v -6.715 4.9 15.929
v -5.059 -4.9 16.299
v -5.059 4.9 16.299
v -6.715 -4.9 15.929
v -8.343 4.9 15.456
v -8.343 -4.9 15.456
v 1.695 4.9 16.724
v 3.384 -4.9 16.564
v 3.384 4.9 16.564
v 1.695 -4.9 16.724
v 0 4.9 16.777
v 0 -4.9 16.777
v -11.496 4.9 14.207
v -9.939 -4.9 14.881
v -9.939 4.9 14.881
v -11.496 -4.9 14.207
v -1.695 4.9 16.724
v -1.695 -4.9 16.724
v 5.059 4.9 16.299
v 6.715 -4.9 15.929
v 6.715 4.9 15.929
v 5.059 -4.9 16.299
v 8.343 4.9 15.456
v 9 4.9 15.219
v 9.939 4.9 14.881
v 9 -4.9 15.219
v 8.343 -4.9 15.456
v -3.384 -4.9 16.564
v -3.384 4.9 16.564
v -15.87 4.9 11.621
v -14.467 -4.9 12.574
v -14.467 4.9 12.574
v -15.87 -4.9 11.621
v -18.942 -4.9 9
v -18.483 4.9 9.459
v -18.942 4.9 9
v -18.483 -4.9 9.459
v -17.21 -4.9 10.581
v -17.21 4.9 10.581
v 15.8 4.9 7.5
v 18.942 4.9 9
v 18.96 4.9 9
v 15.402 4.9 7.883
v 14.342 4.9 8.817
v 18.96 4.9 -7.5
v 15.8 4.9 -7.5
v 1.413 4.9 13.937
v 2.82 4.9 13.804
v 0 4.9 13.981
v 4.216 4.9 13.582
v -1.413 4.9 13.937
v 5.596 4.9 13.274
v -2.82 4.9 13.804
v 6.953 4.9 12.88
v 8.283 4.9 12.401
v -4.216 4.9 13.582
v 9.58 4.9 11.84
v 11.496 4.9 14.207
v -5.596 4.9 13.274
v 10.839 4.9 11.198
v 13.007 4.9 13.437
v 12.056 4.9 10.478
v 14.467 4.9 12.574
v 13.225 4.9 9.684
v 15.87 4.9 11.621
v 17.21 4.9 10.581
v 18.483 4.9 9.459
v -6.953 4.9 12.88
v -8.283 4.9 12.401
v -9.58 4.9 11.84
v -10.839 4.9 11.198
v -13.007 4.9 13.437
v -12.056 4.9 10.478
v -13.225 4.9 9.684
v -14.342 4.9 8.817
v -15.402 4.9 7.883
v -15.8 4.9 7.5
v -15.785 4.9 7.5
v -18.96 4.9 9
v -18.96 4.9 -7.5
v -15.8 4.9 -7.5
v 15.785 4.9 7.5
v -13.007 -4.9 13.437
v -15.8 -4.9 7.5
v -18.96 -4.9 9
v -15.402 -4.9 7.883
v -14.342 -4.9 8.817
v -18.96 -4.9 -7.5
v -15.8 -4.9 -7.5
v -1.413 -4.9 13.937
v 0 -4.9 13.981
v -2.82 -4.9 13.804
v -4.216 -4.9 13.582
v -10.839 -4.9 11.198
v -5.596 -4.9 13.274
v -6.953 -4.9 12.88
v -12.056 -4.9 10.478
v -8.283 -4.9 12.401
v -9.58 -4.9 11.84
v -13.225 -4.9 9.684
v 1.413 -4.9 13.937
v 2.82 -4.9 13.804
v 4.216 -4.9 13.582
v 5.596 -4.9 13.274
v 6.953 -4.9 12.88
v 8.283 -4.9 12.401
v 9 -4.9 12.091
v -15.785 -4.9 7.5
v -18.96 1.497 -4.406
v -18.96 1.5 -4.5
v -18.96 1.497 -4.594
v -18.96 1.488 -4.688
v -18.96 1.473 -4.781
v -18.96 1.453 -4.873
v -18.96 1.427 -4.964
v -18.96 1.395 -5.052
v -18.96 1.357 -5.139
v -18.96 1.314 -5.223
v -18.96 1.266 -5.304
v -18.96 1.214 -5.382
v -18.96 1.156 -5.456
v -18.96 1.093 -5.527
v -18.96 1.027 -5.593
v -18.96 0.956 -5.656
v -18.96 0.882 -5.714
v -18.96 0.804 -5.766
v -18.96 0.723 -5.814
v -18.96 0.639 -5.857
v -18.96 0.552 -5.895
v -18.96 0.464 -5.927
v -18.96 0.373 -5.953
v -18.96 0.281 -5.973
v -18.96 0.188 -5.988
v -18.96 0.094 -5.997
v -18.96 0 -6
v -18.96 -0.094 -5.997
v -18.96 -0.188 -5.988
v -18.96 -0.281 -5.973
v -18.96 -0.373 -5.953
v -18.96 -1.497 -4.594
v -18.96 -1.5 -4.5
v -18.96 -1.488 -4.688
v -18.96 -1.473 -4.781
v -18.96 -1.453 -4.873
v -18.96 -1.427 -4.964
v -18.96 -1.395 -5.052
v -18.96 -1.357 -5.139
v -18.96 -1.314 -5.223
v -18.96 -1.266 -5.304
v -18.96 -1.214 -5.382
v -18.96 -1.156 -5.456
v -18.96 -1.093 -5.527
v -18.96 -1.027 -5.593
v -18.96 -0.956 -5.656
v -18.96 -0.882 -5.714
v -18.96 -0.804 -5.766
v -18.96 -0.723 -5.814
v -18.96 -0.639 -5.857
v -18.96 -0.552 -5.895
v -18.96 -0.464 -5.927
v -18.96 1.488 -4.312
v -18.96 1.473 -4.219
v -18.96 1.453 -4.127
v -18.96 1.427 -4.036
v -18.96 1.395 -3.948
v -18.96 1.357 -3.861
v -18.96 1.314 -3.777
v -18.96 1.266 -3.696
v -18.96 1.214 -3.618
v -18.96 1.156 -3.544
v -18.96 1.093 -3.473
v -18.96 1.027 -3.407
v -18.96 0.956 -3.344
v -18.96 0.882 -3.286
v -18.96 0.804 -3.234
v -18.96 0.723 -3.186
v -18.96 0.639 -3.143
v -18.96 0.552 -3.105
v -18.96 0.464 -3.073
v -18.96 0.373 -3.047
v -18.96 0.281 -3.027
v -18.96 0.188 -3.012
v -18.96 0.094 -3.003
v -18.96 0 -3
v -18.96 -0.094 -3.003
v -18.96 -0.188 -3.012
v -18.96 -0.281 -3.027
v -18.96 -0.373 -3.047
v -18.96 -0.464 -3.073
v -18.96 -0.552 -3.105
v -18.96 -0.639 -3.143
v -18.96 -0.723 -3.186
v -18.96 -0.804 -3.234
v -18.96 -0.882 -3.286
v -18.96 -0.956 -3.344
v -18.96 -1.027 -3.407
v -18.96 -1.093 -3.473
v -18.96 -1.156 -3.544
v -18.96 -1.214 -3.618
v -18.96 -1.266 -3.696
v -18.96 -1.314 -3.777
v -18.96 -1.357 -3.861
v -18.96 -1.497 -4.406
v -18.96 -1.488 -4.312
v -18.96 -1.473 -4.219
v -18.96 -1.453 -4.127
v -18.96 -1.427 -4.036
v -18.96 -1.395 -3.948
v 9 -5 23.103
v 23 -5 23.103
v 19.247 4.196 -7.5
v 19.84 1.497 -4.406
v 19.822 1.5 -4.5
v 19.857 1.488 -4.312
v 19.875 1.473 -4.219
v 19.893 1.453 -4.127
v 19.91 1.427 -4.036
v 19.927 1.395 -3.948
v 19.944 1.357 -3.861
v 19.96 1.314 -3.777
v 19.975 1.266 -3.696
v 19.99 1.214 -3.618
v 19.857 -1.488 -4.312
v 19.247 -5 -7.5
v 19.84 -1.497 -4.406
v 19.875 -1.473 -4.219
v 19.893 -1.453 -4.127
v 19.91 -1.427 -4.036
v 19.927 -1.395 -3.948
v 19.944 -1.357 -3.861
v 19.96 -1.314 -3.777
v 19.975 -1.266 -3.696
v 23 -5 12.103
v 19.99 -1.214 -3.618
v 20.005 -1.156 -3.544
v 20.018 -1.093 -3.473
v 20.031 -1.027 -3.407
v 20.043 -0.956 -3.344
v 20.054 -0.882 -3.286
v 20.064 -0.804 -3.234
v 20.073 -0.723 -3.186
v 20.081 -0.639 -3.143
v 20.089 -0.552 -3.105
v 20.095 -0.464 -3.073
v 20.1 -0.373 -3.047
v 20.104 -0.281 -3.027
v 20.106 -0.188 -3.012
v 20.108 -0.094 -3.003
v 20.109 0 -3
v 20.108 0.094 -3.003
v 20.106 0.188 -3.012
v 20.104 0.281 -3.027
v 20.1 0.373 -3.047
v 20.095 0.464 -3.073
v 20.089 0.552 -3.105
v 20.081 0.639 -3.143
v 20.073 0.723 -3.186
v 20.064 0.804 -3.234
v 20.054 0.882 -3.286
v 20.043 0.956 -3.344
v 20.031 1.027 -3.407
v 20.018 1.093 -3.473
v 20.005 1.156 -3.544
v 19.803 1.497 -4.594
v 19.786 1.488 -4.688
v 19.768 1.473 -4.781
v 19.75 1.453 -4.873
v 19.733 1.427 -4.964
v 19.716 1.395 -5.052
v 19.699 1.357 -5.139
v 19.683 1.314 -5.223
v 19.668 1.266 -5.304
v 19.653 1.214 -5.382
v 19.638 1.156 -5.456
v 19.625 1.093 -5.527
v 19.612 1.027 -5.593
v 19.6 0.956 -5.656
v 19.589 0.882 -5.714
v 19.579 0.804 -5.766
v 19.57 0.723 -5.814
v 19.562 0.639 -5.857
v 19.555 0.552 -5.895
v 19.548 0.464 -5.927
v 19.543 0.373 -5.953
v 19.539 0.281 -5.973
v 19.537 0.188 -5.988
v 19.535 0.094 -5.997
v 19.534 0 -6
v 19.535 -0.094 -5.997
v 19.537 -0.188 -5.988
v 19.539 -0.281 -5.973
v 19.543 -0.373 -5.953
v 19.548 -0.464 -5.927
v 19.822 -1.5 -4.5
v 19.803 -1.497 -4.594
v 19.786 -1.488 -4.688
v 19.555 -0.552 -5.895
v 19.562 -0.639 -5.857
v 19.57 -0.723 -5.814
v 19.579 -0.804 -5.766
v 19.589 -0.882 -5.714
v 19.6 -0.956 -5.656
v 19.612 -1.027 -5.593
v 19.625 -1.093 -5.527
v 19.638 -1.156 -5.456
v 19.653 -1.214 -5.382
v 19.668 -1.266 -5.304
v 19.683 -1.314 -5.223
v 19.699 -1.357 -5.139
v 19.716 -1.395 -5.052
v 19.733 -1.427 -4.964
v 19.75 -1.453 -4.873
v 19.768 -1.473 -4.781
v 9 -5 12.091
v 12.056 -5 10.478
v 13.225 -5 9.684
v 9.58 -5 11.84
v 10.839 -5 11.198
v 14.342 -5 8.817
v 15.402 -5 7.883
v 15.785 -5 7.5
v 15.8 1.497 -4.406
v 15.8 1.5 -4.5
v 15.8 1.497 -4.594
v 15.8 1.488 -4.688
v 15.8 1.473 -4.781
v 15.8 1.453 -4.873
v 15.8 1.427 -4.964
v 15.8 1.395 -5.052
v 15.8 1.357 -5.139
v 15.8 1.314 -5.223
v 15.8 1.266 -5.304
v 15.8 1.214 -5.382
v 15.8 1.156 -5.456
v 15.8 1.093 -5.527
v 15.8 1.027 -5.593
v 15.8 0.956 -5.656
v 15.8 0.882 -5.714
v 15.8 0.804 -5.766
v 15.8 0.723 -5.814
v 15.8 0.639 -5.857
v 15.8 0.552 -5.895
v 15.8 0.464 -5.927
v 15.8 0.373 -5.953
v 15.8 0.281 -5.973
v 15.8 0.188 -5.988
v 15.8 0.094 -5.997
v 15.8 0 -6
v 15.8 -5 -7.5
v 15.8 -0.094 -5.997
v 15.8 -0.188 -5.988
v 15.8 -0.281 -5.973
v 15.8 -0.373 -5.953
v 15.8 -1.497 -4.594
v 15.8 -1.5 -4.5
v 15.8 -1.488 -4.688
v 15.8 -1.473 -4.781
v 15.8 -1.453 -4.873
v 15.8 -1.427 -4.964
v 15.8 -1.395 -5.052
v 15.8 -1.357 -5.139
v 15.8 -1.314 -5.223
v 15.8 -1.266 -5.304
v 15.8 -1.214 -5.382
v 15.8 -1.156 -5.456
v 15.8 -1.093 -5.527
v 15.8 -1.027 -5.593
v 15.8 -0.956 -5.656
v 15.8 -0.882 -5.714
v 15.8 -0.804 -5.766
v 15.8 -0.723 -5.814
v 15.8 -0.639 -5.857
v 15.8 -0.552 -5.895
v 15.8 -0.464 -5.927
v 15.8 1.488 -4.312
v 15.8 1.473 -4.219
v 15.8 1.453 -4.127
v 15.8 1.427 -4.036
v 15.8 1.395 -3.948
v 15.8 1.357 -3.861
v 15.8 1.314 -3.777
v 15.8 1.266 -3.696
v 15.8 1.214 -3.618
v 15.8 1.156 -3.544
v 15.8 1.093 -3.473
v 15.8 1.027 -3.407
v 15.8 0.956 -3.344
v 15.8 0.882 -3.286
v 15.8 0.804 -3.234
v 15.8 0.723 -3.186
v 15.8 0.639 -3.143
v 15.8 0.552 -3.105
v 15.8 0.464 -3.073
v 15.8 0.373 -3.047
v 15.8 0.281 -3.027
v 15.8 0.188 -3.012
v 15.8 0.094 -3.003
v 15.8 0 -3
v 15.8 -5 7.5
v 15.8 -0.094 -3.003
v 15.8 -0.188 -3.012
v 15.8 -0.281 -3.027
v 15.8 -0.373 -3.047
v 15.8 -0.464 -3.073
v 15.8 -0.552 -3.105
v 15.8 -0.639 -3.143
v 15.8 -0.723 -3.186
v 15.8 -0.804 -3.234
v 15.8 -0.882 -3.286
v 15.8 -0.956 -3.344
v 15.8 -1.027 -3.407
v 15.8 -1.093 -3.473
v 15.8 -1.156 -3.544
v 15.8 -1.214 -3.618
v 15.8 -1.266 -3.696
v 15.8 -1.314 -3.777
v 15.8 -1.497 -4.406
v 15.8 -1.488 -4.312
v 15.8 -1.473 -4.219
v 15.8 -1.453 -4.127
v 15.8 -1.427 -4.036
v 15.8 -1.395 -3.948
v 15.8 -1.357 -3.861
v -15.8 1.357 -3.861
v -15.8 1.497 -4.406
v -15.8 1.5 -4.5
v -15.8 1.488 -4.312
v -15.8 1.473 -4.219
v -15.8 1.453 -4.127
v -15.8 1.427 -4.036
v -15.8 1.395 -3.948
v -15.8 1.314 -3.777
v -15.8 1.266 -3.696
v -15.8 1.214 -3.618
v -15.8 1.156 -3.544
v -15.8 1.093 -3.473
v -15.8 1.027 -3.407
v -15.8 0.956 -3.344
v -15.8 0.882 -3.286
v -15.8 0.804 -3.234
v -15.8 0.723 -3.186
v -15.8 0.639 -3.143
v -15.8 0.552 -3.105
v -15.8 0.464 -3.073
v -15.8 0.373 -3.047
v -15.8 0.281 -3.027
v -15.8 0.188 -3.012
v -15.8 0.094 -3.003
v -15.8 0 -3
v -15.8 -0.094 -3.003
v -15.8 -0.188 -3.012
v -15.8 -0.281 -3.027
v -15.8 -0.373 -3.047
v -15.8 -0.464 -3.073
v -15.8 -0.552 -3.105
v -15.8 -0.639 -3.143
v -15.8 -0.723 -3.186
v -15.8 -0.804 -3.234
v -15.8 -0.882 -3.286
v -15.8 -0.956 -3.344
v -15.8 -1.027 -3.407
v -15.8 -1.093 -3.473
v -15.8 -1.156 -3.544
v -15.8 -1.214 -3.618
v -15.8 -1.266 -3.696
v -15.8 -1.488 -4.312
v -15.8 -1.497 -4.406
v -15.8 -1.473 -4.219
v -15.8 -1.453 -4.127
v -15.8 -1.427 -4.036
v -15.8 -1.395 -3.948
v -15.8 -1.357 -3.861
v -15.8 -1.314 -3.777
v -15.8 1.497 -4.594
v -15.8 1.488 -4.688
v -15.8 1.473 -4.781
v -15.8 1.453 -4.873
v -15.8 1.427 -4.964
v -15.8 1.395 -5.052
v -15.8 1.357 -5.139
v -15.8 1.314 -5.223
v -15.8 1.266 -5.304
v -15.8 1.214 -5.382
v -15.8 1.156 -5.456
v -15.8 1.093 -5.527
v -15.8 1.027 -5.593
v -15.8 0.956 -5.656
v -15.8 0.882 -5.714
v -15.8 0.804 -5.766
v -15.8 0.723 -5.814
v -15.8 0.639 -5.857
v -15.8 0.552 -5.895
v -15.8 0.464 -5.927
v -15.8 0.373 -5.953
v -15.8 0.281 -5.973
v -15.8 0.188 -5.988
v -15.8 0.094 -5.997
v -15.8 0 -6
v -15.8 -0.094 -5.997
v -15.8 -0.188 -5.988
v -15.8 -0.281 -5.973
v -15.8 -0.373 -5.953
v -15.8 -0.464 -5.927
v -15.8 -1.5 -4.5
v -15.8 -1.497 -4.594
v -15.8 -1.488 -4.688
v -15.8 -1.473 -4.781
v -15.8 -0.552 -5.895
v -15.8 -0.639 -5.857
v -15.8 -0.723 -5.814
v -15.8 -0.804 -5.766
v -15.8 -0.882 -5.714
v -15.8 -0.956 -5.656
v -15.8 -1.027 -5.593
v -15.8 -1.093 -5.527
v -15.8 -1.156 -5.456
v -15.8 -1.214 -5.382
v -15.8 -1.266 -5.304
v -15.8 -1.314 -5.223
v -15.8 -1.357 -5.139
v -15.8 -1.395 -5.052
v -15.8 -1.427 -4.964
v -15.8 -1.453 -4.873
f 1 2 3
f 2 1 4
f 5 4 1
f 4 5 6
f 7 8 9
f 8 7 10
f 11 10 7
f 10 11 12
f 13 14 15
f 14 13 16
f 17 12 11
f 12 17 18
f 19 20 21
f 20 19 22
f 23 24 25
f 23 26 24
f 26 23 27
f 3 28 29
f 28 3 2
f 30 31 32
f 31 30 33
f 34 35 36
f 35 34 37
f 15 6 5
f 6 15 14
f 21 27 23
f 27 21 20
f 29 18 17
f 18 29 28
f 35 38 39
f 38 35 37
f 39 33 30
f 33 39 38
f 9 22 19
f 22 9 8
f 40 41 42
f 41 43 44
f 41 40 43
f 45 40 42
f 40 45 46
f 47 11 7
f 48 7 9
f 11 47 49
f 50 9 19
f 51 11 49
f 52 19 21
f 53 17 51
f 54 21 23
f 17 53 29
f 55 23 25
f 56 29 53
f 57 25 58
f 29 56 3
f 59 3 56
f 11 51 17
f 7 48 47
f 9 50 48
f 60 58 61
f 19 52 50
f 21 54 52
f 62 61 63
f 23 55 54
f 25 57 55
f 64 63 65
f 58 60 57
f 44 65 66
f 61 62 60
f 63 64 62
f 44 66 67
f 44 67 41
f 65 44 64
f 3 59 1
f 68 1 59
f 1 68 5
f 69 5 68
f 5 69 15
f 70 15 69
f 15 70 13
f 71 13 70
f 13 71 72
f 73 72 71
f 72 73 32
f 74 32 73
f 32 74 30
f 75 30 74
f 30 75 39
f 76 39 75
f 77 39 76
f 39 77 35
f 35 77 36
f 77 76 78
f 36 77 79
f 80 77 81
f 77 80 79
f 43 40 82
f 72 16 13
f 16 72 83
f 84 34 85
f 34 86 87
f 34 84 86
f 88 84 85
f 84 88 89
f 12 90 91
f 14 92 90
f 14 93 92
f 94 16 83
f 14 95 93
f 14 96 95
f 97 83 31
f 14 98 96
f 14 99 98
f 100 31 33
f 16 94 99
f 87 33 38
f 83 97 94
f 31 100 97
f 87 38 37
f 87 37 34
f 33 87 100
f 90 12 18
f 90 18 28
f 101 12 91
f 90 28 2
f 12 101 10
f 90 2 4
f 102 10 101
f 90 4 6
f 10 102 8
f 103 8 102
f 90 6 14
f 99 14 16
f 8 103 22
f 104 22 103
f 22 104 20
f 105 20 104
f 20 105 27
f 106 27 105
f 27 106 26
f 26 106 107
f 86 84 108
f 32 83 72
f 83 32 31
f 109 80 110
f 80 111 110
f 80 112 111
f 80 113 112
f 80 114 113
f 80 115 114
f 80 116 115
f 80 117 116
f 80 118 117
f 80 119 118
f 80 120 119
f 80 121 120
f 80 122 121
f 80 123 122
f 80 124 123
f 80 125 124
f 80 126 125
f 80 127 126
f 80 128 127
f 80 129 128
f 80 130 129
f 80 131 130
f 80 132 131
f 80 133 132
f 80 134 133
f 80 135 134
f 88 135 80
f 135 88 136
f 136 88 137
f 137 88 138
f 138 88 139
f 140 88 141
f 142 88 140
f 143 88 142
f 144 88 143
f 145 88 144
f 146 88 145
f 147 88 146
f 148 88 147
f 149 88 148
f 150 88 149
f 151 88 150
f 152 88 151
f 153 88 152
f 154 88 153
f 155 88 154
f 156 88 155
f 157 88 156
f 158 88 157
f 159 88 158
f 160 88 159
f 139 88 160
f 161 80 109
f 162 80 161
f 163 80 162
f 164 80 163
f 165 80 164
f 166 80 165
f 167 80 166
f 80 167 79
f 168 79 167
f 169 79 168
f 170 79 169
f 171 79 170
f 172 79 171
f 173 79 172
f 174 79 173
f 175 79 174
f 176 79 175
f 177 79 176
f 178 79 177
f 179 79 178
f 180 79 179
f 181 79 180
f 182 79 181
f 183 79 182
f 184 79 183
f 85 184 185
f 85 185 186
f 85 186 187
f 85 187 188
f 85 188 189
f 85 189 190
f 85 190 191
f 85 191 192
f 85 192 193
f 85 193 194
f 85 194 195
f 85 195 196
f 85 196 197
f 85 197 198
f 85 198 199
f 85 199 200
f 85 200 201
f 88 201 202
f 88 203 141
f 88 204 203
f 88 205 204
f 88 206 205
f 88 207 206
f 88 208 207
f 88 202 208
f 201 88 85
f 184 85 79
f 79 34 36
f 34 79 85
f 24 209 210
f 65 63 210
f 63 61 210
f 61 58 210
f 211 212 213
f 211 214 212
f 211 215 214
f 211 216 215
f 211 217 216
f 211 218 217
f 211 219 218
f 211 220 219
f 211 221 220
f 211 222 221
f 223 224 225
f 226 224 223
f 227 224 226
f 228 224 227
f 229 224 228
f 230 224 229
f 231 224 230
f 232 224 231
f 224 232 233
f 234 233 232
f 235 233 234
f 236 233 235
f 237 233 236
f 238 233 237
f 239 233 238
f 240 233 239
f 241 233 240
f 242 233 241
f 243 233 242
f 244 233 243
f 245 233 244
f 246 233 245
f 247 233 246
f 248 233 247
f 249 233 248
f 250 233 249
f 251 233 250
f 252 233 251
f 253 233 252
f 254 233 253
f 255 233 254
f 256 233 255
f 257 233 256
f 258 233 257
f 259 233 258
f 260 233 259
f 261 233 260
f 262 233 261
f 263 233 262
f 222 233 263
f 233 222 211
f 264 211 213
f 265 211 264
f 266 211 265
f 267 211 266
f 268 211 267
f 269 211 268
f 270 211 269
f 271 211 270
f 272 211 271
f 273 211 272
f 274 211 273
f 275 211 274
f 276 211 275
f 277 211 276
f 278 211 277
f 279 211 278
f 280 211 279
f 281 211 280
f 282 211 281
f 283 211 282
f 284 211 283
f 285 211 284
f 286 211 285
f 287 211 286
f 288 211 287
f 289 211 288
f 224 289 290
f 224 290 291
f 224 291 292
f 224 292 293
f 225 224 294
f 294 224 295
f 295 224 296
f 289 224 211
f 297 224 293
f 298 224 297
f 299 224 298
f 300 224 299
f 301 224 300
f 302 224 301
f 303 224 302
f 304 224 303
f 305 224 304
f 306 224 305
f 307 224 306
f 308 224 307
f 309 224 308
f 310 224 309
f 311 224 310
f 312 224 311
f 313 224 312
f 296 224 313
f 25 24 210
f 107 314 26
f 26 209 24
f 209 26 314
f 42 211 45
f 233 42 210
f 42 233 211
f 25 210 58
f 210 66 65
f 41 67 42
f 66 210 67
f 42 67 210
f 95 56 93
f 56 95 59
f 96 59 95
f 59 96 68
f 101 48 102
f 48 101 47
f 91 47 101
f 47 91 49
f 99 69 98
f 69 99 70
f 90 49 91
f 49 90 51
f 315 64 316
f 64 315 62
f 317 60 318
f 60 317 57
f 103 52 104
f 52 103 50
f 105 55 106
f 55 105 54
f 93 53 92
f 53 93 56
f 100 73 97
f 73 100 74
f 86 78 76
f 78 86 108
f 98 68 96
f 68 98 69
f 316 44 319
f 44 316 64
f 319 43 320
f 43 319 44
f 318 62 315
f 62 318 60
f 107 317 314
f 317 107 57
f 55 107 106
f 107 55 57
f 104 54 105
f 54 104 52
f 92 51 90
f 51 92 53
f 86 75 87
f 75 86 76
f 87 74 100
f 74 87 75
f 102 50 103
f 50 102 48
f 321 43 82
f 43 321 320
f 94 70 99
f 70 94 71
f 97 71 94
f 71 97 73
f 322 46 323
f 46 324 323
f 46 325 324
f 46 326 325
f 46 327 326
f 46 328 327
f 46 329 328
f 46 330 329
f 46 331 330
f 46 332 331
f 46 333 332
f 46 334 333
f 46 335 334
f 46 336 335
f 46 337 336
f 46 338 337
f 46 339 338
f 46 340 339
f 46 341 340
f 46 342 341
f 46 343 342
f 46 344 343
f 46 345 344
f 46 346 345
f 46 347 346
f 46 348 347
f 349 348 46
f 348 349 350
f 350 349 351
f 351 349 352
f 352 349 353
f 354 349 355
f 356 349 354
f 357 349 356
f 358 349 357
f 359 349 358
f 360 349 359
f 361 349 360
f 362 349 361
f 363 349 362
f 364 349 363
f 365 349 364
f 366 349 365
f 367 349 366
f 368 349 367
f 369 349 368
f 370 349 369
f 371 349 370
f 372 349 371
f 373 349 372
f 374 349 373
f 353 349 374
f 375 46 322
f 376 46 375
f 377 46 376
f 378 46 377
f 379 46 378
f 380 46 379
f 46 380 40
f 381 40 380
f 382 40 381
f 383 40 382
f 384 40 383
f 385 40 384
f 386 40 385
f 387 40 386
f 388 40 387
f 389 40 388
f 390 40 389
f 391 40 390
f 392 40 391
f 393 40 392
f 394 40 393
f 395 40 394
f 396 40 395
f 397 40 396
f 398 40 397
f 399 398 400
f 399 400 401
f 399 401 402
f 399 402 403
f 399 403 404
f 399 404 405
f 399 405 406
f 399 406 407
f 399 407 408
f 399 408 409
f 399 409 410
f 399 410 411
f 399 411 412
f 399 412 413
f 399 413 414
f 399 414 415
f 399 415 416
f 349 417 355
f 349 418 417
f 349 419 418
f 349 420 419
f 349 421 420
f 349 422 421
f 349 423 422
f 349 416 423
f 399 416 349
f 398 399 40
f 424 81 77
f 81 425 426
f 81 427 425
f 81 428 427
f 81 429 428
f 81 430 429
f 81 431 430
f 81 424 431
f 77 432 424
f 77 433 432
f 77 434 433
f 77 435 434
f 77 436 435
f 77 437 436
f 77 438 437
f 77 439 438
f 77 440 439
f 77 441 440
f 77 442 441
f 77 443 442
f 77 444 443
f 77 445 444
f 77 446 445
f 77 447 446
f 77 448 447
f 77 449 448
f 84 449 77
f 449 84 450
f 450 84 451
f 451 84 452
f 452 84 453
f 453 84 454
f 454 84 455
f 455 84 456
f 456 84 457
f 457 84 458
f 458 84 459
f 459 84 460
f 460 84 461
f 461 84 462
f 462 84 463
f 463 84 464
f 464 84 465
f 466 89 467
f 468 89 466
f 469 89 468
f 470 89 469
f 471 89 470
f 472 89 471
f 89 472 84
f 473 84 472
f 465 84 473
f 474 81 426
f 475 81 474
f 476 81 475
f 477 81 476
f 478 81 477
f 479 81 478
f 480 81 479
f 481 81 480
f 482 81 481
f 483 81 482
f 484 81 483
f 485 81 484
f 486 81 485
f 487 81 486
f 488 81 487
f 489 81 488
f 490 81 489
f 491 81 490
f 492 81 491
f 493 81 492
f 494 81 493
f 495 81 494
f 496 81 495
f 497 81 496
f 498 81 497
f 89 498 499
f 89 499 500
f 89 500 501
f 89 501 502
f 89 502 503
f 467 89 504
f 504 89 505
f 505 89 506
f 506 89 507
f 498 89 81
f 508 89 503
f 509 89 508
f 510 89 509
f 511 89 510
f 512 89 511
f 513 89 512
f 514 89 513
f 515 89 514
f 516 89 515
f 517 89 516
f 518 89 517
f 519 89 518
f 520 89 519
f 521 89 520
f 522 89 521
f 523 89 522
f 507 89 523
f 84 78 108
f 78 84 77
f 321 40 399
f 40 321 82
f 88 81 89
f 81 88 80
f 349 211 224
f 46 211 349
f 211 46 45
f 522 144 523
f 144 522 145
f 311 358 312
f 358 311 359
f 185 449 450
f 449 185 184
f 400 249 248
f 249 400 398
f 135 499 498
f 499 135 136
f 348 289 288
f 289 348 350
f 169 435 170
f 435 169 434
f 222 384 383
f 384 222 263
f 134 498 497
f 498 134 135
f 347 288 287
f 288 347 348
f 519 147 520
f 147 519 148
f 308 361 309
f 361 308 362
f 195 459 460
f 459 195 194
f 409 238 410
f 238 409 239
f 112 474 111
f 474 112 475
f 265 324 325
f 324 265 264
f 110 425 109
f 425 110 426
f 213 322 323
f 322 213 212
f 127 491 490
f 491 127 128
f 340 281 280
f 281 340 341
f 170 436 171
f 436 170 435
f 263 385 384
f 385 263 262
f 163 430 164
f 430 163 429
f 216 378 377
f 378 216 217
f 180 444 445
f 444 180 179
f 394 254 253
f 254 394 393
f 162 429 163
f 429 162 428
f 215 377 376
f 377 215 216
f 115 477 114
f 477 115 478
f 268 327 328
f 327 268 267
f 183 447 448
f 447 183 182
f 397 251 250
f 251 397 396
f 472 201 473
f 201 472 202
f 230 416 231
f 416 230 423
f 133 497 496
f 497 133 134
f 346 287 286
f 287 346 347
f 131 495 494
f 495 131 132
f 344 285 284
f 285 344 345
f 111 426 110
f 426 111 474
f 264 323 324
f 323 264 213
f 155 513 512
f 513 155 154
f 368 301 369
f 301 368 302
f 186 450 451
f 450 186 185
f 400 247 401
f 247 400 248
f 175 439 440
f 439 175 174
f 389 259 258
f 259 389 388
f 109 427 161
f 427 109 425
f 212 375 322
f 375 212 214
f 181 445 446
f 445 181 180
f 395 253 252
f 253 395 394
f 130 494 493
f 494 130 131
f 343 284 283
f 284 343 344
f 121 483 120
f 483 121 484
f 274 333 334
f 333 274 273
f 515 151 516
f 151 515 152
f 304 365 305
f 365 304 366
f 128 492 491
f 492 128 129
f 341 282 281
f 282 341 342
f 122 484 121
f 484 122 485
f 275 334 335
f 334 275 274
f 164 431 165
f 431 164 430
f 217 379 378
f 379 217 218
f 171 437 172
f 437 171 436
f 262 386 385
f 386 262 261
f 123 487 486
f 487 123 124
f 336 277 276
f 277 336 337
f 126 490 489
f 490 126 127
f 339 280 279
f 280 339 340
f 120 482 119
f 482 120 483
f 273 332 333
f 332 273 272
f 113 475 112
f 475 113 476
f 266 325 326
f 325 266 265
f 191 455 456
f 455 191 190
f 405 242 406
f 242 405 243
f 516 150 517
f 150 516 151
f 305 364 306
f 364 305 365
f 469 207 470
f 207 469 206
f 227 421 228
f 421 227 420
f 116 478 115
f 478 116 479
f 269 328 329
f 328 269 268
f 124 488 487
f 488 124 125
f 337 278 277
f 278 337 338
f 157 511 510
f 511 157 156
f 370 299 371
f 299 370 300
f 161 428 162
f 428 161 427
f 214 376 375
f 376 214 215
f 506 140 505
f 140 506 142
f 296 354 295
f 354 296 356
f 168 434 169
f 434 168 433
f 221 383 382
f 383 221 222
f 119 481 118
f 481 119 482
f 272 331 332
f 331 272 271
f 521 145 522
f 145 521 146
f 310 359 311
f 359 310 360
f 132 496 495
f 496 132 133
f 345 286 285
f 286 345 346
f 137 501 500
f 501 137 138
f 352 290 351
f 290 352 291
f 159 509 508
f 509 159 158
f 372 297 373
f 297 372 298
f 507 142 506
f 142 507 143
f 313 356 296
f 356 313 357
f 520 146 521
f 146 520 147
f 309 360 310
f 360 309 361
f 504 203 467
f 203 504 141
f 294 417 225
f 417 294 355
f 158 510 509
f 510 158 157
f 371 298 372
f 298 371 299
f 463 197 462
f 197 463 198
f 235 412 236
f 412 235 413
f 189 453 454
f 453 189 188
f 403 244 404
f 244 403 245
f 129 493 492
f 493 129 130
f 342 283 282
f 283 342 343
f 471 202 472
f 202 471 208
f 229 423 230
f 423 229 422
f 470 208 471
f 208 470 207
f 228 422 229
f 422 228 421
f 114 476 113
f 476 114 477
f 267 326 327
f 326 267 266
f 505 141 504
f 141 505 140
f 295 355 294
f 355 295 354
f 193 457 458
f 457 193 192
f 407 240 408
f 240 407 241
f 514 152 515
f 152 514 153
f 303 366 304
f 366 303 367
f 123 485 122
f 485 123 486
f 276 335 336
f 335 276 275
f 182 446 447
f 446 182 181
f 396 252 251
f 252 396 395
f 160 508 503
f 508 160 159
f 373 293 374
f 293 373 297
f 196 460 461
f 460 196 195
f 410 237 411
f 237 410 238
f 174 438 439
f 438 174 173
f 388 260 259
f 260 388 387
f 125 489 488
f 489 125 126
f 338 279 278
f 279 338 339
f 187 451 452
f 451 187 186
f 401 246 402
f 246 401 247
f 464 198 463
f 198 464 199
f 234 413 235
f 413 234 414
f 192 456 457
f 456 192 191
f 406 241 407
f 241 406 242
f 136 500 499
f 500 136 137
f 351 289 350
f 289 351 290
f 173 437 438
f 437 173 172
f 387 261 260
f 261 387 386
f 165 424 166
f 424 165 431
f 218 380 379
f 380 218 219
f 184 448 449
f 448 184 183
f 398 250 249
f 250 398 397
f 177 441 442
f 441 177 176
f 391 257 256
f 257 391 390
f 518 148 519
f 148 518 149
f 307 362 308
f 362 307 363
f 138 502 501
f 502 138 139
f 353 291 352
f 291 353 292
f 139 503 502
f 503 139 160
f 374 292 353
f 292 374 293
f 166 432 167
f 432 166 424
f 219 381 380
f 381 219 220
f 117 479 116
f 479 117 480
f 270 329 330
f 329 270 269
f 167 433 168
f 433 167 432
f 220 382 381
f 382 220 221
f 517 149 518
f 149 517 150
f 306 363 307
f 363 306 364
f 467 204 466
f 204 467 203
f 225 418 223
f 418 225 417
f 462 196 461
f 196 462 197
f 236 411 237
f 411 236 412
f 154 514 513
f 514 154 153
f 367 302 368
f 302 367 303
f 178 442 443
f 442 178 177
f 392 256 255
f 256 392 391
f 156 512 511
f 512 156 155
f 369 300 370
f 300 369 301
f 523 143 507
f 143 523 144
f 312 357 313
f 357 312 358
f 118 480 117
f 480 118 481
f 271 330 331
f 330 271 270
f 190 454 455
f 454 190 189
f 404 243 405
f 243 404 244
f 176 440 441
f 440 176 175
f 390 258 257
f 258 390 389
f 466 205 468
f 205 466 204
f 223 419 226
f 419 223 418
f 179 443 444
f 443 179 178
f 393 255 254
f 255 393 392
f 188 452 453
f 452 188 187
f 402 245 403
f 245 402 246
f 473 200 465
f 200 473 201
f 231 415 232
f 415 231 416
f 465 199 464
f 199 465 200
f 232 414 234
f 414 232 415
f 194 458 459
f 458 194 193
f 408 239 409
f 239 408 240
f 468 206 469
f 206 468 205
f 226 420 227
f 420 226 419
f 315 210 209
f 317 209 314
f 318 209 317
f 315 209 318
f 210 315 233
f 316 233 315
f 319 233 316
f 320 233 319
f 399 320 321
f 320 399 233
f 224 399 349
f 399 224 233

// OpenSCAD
$fn=100;
e=3 ;

micro_d= 8 ;
micro_l=14 ;

tenor_x=31.6 ;
tenor_y=10 ;
tenor_z=15;
tenor_d=45 ;
tenor_dz = sqrt(tenor_d*tenor_d/4 - tenor_x*tenor_x/4) ;
tenor_arr_d=3;
tenor_sifflet_x=18;
tenor_micro_dz = sqrt(tenor_d*tenor_d/4 - tenor_sifflet_x*tenor_sifflet_x/4) ;

module sifflet()
{
    // cube central
    cube([tenor_x,tenor_y,tenor_z],center = true) ;
    difference()
    {
        //bombe superieur
        translate([0,0,tenor_z/2-tenor_dz])
            rotate([90,0,0])
                cylinder(d= tenor_d ,h=tenor_y,center = true);
        translate([50+tenor_x/2,0,0])
            cube([100,100,100],center=true);
        translate([-50-tenor_x/2,0,0])
            cube([100,100,100],center=true);
        translate([0,0,-50])
            cube([100,100,100],center=true);
    }
}
module porte_micro()
{
    difference()
    {
        union()
        {
            // boitier
            scale([1.2,0.98,1.2])
                sifflet();
            hull()
            {
                difference()
                {
                    // boitier
                    scale([1.2,0.98,1.2])
                        sifflet();
                    translate([-50+tenor_sifflet_x/2,0,0])
                        cube([100,100,100],center=true);
                }
                //porte_micro
                translate([tenor_sifflet_x/2+micro_l/2,-tenor_y/2-micro_d/2-e/2,tenor_z/2+micro_d/2+e/2+tenor_micro_dz-tenor_dz])
                    cube([micro_l,micro_d+e,micro_d+e],center=true);
            }
        }
        // moins la flute
        scale([1.0,4.0,1.0])
            sifflet();
        translate([0,0,-tenor_z/2-50])
            cube([100,100,100],center=true);
        // trou micro
        translate([tenor_sifflet_x/2+micro_l/2,-tenor_y/2-micro_d/2-e/2,tenor_z/2+micro_d/2+e/2+tenor_micro_dz-tenor_dz])
            rotate([0,90,0])
                cylinder(d=micro_d, h = micro_l+10, center = true );
    // teton antiglissement
        translate([0,0,-tenor_z/2+e])
            rotate([0,90,0])
                cylinder(d=e,h=50,center=true);
    }
}


*sifflet() ;
difference()
{
    porte_micro() ;
    translate([0,-100-tenor_y/2,0])
        cube([200,200,200],center = true );
}
